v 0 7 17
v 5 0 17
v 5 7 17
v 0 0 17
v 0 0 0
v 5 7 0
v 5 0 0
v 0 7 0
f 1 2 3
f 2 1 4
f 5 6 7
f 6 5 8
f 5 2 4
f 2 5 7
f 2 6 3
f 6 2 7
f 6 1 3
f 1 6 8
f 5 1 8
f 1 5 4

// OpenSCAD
// Generated by SolidPython 1.0.1 on 2020-07-29 00:39:26


cube(size = [5, 7, 17]);
/***********************************************
*********      SolidPython code:      **********
************************************************
 
# import packages: SolidPython
from solid import *
from solid.utils import *
from itertools import chain, combinations


class Resize:

    def __init__(self, scad_file):
        self.scad_file = scad_file
        #self.scad_file = import_scad(scad_file)
        # cone/cylinder param:
        self.r1 = 0
        self.r2 = 0
        self.h = 0
        # rectangular prism param:
        self.w = 0
        self.l = 0
        # ellipse param:
        self.r = 0

    # import OpenScad code (file name corresponds to shape)


    # classify shape + parameters
    def assign(self, param1, param2, param3):
        if self.scad_file == 'cone.scad':
            self.r1 = param1
            self.r2 = param2
            self.h = param3
        elif self.scad_file == 'cylinder.scad':
            self.r1 = param1
            self.r2 = param2
            self.h = param3
        elif self.scad_file == 'rectangularPrism.scad':
            self.h = param1
            self.l = param2
            self.w = param3
        else:
            self.r = param1
            self.h = param2

    # resize parameters
    def iterate(self):
        x = range(3, 20, 2)
        i = 1
        if self.scad_file == 'cone.scad':
            tempList = list(combinations(x, 2))
            for temp in tempList:
                param1 = temp[0]
                param2 = temp[1]
                filepath = 'produced_scad_files/' + 'cone' + str(param1) + '_' + str(param2) + '_' + '.scad'
                scad_render_to_file(cylinder(h=param1, r1=param2, r2=0), filepath)

        elif self.scad_file == 'cylinder.scad':
            tempList = list(combinations(x, 3))
            for temp in tempList:
                param1 = temp[0]
                param2 = temp[1]
                filepath = 'produced_scad_files/' + 'cylinder' + str(param1) + '_' + str(param2) + '_' + '.scad'
                scad_render_to_file(cylinder(h=param1, r1=param2, r2=param2), filepath)

        elif self.scad_file == 'rectangularPrism.scad':
            tempList = list(combinations(x, 3))
            for temp in tempList:
                param1 = temp[0]
                param2 = temp[1]
                param3 = temp[2]
                filepath = 'produced_scad_files/' + 'rectangularPrism' + str(param1) + '_' + str(param2) + '_' + str(
                    param3) + '.scad'
                scad_render_to_file(cube(size=(param1, param2, param3)), filepath)

        elif self.scad_file == 'ellipse.scad':
            tempList = list(combinations(x, 4))
            for temp in tempList:
                param1 = temp[0]
                param2 = temp[1]
                param3 = temp[2]
                param4 = temp[3]
                filepath = 'produced_scad_files/' + 'ellipse' + str(param1) + '_' + str(param2) + '_' + str(param3) + '_' + str(param4) + '.scad'
                scad_render_to_file(scale([param1, param2, param3])(sphere(r=param4)), filepath)

    def render_to_scadfile(self):
        scad_render_to_file(scad, 'example.scad') 
 
************************************************/
